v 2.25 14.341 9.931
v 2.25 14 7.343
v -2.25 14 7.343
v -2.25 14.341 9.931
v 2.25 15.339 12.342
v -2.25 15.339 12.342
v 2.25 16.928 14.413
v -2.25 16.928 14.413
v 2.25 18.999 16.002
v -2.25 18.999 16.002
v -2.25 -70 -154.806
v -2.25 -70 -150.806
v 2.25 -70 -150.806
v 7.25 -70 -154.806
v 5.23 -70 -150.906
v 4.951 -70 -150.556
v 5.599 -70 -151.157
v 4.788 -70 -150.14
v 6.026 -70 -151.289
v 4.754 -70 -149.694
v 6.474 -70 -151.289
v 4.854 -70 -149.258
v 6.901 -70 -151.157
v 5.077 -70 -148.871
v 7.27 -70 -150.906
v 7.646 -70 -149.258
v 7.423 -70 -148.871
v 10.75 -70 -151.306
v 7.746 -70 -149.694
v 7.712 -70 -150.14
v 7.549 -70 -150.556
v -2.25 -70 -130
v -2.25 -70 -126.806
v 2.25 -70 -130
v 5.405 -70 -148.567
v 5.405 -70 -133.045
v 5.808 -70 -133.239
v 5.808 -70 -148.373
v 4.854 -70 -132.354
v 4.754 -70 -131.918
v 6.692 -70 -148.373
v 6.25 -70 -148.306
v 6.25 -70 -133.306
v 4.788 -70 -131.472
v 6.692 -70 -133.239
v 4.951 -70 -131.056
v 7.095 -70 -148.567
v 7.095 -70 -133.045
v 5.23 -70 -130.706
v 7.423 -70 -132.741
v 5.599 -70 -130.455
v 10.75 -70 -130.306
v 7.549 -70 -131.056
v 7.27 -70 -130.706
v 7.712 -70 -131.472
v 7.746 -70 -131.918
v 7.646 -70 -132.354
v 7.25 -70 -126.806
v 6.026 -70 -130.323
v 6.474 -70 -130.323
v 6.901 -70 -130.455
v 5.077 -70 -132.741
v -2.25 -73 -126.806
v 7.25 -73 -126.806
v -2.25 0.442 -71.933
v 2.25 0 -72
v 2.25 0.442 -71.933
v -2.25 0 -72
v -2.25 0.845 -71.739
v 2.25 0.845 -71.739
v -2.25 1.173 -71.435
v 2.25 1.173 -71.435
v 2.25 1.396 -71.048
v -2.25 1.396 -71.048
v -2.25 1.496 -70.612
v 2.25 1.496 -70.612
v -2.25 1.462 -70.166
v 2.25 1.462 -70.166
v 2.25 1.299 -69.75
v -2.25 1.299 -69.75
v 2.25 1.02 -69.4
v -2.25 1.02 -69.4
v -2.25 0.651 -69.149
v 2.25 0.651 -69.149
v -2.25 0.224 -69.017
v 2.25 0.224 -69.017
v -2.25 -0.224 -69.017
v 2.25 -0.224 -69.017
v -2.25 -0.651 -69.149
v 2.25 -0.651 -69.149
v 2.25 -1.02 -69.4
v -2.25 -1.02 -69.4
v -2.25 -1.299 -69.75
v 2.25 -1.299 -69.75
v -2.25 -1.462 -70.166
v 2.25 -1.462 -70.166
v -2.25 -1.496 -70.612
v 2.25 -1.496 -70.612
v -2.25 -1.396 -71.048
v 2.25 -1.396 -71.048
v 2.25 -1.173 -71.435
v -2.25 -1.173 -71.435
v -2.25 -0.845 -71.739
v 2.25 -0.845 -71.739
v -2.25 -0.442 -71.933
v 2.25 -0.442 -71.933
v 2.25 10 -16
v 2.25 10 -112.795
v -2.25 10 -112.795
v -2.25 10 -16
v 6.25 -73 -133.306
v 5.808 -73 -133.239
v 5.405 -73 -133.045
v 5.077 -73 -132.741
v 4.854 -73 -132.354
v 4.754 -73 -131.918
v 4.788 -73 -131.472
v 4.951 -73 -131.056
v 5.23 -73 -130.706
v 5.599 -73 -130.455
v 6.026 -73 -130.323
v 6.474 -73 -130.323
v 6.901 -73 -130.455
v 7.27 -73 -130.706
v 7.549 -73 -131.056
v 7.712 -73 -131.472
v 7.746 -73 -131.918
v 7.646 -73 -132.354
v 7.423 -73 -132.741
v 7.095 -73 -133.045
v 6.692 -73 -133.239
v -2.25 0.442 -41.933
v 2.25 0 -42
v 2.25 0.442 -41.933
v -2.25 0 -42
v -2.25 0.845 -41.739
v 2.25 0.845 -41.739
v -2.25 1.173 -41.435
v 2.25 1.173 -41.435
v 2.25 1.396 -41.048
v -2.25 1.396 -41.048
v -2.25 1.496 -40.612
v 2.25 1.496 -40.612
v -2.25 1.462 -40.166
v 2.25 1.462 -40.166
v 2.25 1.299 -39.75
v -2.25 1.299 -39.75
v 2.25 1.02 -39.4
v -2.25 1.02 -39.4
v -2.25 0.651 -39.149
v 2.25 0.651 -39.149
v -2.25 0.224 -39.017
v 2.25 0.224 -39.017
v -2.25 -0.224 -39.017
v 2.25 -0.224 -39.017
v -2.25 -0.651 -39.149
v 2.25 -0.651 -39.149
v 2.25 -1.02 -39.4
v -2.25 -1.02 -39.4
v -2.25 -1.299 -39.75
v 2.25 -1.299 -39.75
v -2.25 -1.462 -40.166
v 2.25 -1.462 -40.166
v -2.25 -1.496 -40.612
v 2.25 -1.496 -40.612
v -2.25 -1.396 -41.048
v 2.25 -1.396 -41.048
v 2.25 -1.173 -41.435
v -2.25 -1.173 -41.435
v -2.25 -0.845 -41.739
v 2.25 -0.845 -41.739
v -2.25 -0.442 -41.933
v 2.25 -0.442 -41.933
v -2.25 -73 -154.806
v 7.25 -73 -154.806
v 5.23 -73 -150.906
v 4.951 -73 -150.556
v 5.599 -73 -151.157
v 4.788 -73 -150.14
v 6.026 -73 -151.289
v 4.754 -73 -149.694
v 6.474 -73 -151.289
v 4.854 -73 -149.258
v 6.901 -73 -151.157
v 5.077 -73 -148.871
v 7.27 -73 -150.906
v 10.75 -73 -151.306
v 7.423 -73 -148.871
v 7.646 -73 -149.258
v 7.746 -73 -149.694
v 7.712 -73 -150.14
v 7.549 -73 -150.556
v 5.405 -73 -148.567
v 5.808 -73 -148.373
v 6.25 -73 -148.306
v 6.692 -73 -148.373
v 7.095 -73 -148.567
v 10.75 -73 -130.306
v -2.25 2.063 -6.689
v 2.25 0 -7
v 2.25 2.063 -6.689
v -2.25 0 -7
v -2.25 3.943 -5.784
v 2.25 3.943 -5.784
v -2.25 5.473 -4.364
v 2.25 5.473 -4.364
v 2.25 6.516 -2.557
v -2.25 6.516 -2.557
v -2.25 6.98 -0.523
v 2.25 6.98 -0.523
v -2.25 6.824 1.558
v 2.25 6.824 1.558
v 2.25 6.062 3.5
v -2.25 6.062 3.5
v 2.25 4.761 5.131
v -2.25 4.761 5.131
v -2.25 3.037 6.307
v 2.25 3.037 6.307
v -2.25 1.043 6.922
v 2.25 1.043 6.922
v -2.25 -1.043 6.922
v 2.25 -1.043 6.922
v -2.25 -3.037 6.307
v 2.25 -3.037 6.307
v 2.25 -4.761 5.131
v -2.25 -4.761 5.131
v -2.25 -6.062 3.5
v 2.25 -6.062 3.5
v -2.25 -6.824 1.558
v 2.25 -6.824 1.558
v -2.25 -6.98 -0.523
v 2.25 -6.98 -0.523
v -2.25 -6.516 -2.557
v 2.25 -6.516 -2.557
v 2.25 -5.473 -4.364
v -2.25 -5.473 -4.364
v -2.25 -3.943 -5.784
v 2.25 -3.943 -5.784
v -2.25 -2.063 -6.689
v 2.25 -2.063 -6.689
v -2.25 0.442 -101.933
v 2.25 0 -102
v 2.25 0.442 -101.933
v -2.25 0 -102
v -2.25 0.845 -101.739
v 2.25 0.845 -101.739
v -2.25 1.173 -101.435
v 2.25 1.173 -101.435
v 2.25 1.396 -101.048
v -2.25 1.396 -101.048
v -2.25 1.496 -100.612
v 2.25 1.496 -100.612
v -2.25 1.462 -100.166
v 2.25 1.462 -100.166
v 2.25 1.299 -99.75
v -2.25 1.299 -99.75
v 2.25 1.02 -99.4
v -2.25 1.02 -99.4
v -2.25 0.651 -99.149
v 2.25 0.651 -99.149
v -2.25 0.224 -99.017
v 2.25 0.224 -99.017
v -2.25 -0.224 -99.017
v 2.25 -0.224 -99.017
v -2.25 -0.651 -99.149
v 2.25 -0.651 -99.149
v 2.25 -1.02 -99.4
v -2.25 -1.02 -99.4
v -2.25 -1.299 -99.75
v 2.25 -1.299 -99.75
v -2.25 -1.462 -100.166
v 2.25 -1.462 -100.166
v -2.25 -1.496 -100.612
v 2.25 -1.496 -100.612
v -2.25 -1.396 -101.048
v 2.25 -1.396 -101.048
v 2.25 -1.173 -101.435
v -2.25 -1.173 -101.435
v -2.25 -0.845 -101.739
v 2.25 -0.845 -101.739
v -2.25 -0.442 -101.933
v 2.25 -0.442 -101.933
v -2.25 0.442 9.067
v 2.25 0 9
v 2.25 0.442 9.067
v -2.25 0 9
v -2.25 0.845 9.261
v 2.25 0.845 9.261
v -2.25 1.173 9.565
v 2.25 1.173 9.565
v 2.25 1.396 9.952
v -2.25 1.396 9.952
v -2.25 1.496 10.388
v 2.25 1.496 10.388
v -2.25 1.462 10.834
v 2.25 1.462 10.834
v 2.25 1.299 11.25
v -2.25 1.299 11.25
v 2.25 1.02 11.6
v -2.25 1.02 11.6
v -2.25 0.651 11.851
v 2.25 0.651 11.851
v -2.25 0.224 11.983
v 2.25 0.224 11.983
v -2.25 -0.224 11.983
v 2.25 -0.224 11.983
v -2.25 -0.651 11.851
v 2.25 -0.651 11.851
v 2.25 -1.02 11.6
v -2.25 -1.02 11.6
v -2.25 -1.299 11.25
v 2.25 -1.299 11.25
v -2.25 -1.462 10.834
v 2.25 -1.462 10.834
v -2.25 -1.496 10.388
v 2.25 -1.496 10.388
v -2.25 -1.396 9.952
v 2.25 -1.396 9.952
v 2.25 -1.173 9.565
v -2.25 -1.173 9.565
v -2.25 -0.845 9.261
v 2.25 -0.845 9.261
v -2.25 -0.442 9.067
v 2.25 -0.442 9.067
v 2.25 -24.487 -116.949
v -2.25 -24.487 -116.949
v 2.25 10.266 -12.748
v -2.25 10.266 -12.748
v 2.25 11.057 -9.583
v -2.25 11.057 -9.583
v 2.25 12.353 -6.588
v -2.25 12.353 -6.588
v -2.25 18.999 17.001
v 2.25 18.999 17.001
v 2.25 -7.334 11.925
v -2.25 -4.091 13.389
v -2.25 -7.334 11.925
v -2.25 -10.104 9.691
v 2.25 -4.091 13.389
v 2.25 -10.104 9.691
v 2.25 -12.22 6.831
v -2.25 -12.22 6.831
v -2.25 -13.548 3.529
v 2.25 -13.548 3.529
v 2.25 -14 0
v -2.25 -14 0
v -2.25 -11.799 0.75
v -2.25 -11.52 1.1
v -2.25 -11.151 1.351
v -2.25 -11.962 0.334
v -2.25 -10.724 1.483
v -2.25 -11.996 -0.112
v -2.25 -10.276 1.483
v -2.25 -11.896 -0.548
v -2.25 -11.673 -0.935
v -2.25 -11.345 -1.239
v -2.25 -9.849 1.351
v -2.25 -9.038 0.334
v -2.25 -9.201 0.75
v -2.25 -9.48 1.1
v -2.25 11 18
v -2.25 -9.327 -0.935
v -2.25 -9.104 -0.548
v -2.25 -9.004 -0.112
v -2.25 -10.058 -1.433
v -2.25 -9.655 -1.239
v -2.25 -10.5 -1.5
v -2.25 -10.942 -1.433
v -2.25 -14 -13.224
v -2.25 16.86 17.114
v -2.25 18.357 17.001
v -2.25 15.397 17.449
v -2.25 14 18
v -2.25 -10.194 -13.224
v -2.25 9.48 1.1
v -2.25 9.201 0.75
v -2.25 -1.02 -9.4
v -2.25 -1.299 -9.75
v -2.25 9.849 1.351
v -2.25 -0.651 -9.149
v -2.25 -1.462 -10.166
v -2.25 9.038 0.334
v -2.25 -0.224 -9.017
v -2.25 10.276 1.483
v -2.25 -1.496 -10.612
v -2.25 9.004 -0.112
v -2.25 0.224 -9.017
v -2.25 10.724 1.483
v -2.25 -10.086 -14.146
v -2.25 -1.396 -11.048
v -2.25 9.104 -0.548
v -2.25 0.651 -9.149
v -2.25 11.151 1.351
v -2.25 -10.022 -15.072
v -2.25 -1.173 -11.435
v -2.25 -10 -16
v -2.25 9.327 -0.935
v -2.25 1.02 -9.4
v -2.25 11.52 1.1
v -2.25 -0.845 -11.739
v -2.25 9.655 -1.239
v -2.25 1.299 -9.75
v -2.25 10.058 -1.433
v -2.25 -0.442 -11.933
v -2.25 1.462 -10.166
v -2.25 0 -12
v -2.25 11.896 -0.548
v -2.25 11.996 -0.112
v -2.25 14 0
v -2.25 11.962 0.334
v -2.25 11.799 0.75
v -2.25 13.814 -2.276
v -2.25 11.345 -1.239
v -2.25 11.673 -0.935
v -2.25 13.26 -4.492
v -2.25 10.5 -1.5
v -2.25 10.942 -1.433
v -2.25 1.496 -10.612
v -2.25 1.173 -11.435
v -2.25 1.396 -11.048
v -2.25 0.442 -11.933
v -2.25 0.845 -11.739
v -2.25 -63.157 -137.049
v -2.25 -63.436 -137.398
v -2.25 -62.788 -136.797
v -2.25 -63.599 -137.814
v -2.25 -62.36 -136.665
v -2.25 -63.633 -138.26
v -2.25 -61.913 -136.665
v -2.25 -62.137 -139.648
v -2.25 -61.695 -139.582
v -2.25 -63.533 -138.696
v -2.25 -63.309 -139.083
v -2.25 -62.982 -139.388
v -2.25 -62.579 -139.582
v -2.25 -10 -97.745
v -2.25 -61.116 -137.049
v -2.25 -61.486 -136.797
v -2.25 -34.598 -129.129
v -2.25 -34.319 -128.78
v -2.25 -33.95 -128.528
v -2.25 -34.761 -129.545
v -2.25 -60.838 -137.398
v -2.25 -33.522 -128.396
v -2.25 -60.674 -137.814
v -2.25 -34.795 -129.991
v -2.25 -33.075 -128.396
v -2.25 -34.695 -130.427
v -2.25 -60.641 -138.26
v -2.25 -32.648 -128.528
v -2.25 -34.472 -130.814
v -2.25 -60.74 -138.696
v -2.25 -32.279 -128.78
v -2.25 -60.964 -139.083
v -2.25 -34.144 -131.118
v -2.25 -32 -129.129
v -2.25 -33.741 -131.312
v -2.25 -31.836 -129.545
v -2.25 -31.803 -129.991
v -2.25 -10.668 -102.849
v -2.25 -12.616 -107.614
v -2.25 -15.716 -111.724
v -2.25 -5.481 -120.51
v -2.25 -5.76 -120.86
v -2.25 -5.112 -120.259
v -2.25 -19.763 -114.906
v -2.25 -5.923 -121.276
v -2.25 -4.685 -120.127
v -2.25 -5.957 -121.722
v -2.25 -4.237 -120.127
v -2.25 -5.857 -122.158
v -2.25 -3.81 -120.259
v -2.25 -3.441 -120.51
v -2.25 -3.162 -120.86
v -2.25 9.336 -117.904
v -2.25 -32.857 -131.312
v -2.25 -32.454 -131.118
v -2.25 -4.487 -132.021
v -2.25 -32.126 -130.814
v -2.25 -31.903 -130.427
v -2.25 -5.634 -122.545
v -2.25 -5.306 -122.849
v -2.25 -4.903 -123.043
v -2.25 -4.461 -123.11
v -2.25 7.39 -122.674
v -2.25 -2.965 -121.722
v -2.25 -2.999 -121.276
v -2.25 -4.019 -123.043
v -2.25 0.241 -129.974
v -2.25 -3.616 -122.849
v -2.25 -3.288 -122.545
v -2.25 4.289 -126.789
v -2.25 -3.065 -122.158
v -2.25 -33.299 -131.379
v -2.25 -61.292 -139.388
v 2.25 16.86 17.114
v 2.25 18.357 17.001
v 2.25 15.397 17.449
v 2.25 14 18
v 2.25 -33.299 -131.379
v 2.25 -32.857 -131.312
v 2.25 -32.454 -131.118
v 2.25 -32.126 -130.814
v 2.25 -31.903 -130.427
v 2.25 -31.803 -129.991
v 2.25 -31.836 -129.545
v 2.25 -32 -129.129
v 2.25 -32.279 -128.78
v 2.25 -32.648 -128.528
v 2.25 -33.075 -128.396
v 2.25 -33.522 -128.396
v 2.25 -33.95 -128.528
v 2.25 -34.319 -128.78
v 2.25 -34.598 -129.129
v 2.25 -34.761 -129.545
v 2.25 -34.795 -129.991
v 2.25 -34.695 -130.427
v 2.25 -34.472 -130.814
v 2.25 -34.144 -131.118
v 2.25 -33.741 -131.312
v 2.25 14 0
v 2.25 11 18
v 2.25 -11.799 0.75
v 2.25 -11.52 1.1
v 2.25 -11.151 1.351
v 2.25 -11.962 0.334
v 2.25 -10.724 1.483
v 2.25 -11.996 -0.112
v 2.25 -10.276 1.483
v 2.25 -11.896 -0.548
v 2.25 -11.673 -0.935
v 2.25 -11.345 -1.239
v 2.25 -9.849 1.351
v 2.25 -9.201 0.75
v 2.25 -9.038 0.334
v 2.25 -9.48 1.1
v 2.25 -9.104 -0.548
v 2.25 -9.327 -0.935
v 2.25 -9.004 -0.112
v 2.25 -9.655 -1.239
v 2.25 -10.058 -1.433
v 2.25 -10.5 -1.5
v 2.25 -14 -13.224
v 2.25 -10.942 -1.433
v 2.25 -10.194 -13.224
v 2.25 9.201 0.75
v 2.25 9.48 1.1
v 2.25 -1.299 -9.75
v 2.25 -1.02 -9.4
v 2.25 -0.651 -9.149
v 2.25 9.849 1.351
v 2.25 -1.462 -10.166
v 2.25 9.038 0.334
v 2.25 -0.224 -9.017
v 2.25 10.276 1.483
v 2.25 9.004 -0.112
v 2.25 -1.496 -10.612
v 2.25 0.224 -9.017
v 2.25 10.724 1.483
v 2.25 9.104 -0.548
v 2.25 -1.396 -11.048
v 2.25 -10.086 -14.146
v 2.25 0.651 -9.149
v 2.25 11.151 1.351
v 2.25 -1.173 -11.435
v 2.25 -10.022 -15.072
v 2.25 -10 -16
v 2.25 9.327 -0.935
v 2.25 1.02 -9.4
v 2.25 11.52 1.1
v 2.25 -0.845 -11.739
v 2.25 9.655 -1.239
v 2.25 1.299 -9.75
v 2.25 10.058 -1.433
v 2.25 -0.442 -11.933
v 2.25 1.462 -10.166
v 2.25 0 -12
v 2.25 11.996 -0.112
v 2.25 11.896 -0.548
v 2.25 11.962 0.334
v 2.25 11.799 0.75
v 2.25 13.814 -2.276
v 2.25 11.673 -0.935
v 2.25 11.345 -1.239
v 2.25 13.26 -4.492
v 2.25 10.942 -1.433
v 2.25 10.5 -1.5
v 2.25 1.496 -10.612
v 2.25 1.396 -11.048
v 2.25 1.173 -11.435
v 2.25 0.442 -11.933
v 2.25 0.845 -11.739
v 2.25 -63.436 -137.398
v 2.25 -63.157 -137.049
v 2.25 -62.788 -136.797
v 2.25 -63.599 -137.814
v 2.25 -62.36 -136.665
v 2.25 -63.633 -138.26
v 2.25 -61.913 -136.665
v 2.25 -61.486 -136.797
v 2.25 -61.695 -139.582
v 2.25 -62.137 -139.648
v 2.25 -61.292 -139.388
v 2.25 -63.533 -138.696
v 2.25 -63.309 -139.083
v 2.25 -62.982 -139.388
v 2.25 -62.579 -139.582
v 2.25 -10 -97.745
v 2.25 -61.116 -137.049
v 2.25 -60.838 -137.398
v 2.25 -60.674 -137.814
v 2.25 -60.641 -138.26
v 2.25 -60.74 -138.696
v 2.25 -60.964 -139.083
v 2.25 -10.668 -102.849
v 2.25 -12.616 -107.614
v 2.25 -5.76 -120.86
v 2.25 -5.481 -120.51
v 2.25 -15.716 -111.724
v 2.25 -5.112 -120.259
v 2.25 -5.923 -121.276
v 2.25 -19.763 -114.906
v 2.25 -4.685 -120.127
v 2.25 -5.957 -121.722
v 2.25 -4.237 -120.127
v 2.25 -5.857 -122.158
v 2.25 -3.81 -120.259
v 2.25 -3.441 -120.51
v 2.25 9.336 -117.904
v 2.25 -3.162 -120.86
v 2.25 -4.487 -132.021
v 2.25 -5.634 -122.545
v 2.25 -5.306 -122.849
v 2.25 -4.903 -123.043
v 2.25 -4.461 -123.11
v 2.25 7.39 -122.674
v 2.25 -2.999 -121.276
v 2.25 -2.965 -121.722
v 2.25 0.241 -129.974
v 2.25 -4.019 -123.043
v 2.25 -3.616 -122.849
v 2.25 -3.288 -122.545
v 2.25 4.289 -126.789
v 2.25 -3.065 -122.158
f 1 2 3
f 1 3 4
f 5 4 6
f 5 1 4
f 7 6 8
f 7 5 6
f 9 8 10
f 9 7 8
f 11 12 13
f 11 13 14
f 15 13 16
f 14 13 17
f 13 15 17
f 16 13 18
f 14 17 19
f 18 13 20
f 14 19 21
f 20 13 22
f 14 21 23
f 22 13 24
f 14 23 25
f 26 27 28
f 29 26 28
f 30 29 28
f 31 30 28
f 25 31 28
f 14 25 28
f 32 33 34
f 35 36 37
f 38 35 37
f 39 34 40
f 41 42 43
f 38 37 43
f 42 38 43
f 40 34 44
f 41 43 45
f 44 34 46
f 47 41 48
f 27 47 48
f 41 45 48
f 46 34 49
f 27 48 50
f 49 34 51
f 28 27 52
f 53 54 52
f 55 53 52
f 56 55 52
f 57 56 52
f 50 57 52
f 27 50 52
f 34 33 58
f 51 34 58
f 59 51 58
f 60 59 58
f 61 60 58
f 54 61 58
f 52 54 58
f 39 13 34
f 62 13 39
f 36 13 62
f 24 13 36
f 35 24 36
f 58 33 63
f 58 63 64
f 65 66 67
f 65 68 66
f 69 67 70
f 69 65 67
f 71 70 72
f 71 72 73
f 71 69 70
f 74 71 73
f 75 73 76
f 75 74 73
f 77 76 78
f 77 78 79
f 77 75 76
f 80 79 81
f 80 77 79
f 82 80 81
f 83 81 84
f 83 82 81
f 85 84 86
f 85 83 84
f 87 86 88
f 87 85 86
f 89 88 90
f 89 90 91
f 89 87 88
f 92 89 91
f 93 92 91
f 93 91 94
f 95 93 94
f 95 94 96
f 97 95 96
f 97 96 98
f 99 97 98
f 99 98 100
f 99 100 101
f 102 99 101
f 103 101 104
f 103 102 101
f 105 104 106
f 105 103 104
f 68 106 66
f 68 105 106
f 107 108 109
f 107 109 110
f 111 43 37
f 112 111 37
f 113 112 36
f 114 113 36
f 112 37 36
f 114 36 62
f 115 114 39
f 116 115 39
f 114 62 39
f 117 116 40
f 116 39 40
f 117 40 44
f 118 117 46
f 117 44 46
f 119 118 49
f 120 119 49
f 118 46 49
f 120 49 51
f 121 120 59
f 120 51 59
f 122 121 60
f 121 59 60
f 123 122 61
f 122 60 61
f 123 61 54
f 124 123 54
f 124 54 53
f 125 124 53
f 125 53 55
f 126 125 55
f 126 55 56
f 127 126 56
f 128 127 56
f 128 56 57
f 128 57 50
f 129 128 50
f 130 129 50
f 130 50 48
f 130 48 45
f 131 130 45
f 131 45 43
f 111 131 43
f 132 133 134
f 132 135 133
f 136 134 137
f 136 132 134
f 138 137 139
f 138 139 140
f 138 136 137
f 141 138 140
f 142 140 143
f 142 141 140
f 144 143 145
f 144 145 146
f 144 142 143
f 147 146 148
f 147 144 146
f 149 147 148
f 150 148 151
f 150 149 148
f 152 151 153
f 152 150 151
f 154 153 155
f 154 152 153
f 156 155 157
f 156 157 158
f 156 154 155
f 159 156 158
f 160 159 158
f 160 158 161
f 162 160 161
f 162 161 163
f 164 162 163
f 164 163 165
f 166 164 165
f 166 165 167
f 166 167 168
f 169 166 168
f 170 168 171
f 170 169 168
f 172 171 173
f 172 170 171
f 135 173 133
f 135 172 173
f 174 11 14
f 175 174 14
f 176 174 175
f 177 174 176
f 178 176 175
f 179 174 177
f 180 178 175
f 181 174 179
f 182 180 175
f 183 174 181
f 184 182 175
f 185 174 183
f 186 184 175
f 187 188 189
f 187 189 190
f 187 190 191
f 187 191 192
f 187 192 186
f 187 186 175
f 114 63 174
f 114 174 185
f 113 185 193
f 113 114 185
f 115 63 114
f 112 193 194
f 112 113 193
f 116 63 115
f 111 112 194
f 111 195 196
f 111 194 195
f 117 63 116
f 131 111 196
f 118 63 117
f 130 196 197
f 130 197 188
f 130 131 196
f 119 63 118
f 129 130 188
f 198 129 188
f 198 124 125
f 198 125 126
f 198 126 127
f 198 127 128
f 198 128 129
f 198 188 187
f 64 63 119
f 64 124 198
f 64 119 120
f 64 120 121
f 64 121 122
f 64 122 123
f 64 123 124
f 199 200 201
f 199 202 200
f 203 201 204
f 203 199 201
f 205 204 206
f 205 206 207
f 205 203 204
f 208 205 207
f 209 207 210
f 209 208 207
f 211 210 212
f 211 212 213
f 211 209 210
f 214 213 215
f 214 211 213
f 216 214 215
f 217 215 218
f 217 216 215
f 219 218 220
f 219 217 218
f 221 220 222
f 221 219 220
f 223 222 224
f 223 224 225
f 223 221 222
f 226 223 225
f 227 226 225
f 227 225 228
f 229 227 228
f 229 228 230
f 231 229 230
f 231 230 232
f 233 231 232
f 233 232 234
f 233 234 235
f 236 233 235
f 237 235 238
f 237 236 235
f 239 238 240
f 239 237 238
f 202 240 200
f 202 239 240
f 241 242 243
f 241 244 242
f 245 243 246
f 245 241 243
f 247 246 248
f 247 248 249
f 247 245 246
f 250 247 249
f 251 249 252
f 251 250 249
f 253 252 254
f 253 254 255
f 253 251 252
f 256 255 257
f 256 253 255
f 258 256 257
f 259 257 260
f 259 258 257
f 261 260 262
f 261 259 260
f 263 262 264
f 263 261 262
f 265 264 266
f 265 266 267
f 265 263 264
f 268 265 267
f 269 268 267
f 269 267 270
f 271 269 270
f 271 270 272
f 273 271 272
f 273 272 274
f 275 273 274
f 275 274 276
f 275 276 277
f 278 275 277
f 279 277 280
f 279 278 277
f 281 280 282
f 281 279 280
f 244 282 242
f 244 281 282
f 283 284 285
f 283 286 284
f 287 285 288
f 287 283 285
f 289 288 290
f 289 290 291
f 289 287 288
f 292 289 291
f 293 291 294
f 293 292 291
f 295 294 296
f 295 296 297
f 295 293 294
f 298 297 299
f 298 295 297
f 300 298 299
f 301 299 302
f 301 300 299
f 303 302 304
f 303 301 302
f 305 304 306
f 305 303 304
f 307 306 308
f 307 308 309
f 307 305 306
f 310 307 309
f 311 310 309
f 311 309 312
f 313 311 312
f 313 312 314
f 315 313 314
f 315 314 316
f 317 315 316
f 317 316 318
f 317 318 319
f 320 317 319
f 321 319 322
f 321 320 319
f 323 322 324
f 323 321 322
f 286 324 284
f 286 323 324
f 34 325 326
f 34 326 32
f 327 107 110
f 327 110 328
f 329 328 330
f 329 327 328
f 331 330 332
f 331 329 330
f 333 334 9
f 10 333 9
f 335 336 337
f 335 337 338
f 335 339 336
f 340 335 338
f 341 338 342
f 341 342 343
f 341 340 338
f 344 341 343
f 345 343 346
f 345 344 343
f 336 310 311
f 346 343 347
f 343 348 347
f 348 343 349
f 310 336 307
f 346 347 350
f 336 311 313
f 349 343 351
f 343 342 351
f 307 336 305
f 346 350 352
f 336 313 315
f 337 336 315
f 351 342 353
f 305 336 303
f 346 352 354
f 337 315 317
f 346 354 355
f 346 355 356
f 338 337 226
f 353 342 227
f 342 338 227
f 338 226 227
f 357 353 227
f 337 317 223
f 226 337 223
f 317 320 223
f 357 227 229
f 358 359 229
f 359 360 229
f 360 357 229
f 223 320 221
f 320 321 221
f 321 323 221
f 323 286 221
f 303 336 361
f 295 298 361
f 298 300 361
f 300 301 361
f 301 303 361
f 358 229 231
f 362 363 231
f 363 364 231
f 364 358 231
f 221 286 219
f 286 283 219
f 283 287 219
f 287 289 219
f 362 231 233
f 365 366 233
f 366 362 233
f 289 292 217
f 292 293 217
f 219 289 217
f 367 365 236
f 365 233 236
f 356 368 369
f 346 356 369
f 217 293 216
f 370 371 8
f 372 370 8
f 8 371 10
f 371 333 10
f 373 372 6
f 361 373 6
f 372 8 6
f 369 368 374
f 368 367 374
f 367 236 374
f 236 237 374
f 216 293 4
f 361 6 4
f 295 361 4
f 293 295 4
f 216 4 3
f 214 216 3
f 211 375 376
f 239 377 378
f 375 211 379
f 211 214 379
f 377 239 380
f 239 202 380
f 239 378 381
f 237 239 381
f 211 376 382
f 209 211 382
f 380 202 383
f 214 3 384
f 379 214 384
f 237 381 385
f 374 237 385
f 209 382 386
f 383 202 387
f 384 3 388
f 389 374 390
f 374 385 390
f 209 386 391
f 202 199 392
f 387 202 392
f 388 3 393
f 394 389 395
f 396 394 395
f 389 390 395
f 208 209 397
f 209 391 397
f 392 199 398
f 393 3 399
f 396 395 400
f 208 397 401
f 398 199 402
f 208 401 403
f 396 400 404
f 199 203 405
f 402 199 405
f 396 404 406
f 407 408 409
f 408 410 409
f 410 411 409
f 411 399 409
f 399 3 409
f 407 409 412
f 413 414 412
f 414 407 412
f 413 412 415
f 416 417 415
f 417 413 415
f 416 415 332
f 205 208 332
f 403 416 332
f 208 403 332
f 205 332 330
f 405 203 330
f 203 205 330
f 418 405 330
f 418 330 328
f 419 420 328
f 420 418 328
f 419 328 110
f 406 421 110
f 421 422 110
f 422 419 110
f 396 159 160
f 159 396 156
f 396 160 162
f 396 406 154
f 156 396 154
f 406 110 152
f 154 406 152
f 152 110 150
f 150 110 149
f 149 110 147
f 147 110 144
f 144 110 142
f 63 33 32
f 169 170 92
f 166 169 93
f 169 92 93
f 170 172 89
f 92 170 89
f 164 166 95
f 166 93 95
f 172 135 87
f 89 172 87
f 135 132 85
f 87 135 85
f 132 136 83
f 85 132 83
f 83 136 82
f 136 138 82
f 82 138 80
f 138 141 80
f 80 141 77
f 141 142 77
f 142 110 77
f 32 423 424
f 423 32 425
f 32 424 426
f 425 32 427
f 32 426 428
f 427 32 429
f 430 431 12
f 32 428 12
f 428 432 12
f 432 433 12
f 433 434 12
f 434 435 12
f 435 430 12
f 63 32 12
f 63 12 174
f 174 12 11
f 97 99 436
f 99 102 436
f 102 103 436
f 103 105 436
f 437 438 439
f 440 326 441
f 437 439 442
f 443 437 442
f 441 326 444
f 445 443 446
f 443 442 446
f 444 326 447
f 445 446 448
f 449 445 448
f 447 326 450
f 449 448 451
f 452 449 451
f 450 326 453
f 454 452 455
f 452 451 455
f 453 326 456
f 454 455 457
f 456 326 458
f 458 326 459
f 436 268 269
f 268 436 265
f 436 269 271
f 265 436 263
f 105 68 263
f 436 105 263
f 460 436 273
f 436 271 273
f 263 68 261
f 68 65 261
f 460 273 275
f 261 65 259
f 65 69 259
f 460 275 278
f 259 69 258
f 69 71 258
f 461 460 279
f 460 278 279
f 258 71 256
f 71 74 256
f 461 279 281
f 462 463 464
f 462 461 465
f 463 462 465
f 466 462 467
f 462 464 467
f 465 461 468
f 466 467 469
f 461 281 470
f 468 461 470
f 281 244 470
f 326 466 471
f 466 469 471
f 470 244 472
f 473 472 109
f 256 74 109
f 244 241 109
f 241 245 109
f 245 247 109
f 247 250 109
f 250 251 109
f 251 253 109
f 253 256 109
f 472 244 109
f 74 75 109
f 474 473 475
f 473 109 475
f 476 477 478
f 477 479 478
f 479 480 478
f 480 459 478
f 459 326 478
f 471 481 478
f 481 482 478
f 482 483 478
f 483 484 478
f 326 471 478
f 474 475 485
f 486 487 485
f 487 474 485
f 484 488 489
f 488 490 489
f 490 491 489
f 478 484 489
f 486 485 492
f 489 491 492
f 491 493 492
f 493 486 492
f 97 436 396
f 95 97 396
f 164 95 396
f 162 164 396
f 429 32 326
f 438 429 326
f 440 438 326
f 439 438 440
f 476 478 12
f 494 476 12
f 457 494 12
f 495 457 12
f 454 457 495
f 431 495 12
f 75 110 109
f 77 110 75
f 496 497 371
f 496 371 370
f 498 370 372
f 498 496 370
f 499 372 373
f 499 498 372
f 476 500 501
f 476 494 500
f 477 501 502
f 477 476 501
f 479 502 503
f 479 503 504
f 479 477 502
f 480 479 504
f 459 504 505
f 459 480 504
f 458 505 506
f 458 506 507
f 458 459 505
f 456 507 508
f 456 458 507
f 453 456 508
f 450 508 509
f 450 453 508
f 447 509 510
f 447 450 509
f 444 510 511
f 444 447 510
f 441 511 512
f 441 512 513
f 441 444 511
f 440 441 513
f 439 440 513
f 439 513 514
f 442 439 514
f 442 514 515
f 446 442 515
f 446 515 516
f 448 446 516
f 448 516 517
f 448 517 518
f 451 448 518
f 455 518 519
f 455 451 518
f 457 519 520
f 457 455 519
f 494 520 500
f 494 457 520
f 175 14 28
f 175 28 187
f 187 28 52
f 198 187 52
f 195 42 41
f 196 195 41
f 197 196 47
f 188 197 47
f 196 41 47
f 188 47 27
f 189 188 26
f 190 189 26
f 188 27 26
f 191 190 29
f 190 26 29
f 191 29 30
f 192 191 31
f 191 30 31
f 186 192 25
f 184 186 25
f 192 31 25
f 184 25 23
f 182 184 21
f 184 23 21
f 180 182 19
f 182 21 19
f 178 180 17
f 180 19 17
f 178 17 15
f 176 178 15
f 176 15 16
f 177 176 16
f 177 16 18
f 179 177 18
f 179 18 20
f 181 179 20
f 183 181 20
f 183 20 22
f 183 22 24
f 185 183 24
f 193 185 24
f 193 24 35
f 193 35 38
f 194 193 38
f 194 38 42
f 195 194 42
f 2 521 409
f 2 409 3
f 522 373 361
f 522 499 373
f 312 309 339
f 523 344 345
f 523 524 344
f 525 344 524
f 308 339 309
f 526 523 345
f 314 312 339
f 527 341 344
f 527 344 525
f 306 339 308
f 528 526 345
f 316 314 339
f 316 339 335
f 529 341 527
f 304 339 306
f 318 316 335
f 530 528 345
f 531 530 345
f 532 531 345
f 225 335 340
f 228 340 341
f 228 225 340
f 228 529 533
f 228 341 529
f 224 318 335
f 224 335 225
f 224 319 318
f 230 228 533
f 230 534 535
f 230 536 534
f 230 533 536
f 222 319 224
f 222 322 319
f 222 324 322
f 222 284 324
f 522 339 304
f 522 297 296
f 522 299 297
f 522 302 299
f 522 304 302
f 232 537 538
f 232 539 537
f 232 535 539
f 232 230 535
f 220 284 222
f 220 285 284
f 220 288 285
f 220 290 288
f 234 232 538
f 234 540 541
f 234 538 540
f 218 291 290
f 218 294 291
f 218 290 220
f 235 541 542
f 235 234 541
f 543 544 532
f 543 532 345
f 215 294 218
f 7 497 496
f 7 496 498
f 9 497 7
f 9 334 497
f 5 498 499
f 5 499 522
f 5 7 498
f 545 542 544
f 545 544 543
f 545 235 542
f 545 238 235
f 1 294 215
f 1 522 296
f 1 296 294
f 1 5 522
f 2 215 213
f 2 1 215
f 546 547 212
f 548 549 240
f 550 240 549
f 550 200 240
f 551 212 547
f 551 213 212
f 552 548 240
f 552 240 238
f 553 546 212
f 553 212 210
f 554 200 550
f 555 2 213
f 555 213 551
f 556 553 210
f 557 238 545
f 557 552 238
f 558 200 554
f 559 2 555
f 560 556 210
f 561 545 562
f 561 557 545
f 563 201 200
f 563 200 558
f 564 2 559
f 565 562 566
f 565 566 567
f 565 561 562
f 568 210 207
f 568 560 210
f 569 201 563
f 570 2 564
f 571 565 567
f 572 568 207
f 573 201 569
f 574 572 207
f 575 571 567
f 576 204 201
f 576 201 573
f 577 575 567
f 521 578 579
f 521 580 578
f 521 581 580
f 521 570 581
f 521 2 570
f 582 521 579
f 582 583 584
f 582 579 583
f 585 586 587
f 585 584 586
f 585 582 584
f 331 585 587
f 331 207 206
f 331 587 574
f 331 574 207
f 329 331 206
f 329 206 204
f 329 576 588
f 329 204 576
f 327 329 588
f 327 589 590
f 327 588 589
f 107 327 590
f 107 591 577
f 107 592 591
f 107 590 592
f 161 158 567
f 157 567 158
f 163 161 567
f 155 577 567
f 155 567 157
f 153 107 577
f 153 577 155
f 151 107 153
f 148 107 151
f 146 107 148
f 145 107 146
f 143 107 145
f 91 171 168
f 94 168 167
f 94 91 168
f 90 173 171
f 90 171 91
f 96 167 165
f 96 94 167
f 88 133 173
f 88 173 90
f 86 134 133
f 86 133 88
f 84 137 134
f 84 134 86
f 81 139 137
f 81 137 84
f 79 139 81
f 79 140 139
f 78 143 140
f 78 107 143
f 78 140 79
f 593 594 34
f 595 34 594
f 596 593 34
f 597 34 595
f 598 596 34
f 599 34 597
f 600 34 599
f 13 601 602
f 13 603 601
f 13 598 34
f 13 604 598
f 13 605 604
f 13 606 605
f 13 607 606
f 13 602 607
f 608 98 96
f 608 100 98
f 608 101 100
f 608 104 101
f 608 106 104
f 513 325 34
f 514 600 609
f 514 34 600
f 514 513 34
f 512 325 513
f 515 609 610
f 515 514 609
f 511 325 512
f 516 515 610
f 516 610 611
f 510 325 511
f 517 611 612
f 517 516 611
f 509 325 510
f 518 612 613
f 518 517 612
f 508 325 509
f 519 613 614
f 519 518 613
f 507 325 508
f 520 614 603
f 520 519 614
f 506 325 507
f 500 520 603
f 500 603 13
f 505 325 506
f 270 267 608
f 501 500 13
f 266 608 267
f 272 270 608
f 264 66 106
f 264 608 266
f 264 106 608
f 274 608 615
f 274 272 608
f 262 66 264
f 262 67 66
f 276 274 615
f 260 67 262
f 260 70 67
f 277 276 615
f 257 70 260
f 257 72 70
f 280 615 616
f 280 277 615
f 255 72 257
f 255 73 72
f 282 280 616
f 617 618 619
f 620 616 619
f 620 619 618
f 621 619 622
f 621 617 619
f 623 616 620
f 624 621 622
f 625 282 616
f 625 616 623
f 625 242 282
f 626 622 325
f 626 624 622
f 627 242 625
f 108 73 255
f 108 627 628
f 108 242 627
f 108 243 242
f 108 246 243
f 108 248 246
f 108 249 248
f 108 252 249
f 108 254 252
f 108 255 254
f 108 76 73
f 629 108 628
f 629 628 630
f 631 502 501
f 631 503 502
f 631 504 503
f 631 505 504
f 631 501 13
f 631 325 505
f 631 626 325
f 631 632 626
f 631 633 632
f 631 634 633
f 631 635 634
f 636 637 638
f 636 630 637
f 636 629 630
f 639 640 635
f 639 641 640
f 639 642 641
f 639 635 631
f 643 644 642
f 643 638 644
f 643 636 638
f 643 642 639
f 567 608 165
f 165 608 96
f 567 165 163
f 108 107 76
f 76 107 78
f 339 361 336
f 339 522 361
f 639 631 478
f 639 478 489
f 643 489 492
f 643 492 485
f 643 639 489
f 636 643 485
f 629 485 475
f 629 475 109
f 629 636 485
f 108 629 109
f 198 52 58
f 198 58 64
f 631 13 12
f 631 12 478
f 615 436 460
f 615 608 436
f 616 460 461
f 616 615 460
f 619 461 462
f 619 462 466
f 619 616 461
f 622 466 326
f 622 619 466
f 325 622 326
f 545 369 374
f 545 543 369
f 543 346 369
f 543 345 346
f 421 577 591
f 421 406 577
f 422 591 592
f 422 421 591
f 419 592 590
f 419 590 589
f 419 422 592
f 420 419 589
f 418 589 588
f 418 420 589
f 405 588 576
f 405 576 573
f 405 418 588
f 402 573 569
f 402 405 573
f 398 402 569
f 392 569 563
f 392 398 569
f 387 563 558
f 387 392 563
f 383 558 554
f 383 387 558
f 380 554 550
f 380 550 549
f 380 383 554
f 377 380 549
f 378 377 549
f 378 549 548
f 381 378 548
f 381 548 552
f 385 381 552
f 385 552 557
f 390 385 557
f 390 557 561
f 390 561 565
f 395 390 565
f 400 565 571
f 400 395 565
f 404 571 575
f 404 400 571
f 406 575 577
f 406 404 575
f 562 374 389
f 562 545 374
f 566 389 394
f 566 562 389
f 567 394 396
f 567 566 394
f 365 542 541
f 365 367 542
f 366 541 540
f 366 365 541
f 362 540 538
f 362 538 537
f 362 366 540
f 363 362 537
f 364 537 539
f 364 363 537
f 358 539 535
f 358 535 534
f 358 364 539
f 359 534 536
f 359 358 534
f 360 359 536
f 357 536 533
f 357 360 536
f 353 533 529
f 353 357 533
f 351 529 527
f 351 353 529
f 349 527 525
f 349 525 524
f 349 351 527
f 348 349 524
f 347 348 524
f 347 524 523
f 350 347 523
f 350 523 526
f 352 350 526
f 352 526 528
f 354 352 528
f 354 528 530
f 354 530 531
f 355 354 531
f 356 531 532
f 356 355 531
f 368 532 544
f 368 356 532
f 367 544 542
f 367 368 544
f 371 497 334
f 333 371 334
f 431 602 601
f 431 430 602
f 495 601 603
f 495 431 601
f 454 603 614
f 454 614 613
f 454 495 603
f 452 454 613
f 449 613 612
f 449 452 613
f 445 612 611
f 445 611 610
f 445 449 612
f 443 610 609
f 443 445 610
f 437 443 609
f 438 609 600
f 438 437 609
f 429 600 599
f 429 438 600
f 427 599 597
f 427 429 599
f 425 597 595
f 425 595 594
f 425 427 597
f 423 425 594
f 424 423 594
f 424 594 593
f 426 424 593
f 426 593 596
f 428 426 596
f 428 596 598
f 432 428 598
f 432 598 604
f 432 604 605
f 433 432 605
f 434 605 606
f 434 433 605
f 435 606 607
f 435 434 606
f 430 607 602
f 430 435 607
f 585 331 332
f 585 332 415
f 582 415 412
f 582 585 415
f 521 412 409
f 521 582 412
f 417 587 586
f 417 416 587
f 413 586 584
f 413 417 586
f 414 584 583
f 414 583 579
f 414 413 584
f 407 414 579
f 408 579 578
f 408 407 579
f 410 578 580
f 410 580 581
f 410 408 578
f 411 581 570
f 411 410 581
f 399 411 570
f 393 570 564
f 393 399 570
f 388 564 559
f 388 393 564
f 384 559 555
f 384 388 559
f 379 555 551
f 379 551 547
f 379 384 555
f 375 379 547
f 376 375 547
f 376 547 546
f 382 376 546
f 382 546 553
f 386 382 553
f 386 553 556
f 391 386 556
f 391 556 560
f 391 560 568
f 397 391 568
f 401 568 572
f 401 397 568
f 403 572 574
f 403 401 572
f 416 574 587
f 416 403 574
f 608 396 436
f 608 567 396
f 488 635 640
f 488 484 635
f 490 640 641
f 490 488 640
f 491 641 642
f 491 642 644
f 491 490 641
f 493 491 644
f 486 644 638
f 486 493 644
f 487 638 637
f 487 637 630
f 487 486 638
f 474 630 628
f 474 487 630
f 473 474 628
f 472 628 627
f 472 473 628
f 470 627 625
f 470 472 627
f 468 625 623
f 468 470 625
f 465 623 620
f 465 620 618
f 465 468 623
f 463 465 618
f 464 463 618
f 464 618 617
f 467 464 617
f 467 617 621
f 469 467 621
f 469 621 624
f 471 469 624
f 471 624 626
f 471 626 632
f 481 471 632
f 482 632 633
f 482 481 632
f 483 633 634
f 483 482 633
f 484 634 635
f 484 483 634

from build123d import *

# Parameters (mm, degrees)
SKETCH_1_R          = 1.5
SKETCH_1_R_2        = 7
EXTRUDE_1_DEPTH     = 2.25
SKETCH_5_W          = 13
SKETCH_5_H          = 28
EXTRUDE_3_DEPTH     = 3
SKETCH_6_R          = 1.5
CUT_EXTRUDE_2_DEPTH = 177.455253939
SKETCH_7_W          = 0.998721622
SKETCH_7_H          = 4.998741363
EXTRUDE_4_DEPTH     = 4.5
FILLET_1_R          = 10
CHAMFER_1_SIZE      = 3.5


with BuildPart() as part:
    # 草图1 → 凸台-拉伸1 (new, symmetric)
    with BuildSketch(Plane(origin=(0, 0, 0), x_dir=(0, 0, -1), z_dir=(1, 0, 0))):
        with BuildLine():
            ThreePointArc((97.745383074, -10), (109.768953128, -14.033657178), (116.949426552, -24.487241658))
            Line((116.949426552, -24.487241658), (130, -70))
            Line((130, -70), (150.805988717, -70))
            Line((150.805988717, -70), (132.020510773, -4.487252884))
            ThreePointArc((132.020510773, -4.487252884), (124.831577318, 5.972710201), (112.795276854, 10))
            Line((112.795276854, 10), (16, 10))
            ThreePointArc((16, 10), (11.149287499, 10.597149997), (6.588235294, 12.352941176))
            ThreePointArc((6.588235294, 12.352941176), (3.395498751, 13.581995002), (0, 14))
            Line((0, 14), (-18, 14))
            Line((-18, 14), (-18, 11))
            Line((-18, 11), (-13.388941598, -4.090995342))
            ThreePointArc((-13.388941598, -4.090995342), (-8.328447191, -11.253309175), (0, -14))
            Line((0, -14), (13.224243357, -14))
            Line((13.224243357, -14), (13.224243357, -10.193557234))
            ThreePointArc((13.224243357, -10.193557234), (14.608751519, -10.048447989), (16, -10))
            Line((16, -10), (97.745383074, -10))
        make_face()
        with Locations((138.148241349, -62.136741787)):
            Circle(SKETCH_1_R, mode=Mode.SUBTRACT)
        with Locations((129.879120675, -33.298890909)):
            Circle(SKETCH_1_R, mode=Mode.SUBTRACT)
        with Locations((0, -10.5)):
            Circle(SKETCH_1_R, mode=Mode.SUBTRACT)
        with Locations((-10.5, 0)):
            Circle(SKETCH_1_R, mode=Mode.SUBTRACT)
        Circle(SKETCH_1_R_2, mode=Mode.SUBTRACT)
        with Locations((10.5, 0)):
            Circle(SKETCH_1_R, mode=Mode.SUBTRACT)
        with Locations((0, 10.5)):
            Circle(SKETCH_1_R, mode=Mode.SUBTRACT)
        with Locations((40.5, 0)):
            Circle(SKETCH_1_R, mode=Mode.SUBTRACT)
        with Locations((70.5, 0)):
            Circle(SKETCH_1_R, mode=Mode.SUBTRACT)
        with Locations((100.5, 0)):
            Circle(SKETCH_1_R, mode=Mode.SUBTRACT)
        with Locations((121.61, -4.461040031)):
            Circle(SKETCH_1_R, mode=Mode.SUBTRACT)
    extrude(amount=EXTRUDE_1_DEPTH, both=True)

    # 草图5 → 凸台-拉伸3 (add)
    with BuildSketch(Plane.XZ.offset(70)):
        with Locations((4.25, -140.805988717)):
            Rectangle(SKETCH_5_W, SKETCH_5_H)
    extrude(amount=EXTRUDE_3_DEPTH)

    # 草图6 → 切除-拉伸2 (cut, through all)
    with BuildSketch(Plane(origin=(0, -70, 0), x_dir=(1, 0, 0), z_dir=(0, 1, 0))):
        with Locations(Location((6.25, 149.805988717, 0), (0, 0, 270))):
            Circle(SKETCH_6_R)
        with Locations(Location((6.25, 131.805988717, 0), (0, 0, 90))):
            Circle(SKETCH_6_R)
    extrude(amount=-CUT_EXTRUDE_2_DEPTH, mode=Mode.SUBTRACT)

    # 草图7 → 凸台-拉伸4 (add)
    with BuildSketch(Plane(origin=(2.25, 0, 0), x_dir=(0, 0, -1), z_dir=(1, 0, 0))):
        with Locations((-16.501706932, 16.499370682)):
            Rectangle(SKETCH_7_W, SKETCH_7_H)
    extrude(amount=-EXTRUDE_4_DEPTH)

    # 圆角1
    # the kernel refuses this fillet: 10 mm, written as the material it adds along each edge
    with BuildSketch(Plane(origin=(2.25, 14, 16.002346121), x_dir=(0, 0, -1), z_dir=(-1, 0, 0))) as fillet_1_piece_1:
        with BuildLine():
            CenterArc((8.659527241, -10), FILLET_1_R, 90, 59.991672573)
            Line((0, -4.998741363), (-0.173190545, -4.89871619))
            ThreePointArc((-0.173190545, -4.89871619), (-0.2, -2.499370681), (-0.2, 0))
            Line((-0.2, 0), (0, 0.2))
            Line((0, 0.2), (8.659527241, 0.2))
            Line((8.659527241, 0.2), (8.659527241, 0))
        make_face()
    extrude(amount=4.5)
    with BuildSketch(Plane(origin=(2.25, 14, 17.001067743), x_dir=(0, 0, 1), z_dir=(-1, 0, 0))) as fillet_1_piece_2:
        with BuildLine():
            CenterArc((10, 4.356693642), FILLET_1_R, 180, 25.82789421)
            Line((0, 4.356693642), (-0.2, 4.356693642))
            Line((-0.2, 4.356693642), (-0.2, 0))
            Line((-0.2, 0), (0, -0.2))
            ThreePointArc((0, -0.2), (0.499466129, -0.2), (0.818910902, -0.087133873))
            Line((0.818910902, -0.087133873), (0.998932257, 0))
        make_face()
    extrude(amount=4.5)

    # 倒角1
    chamfer_1_edges = [part.edges().sort_by_distance(p)[0] for p in [
        (10.75, -71.5, -154.805988717),
        (10.75, -71.5, -126.805988717),
    ]]
    chamfer(chamfer_1_edges, length=CHAMFER_1_SIZE)


solid = part.part
